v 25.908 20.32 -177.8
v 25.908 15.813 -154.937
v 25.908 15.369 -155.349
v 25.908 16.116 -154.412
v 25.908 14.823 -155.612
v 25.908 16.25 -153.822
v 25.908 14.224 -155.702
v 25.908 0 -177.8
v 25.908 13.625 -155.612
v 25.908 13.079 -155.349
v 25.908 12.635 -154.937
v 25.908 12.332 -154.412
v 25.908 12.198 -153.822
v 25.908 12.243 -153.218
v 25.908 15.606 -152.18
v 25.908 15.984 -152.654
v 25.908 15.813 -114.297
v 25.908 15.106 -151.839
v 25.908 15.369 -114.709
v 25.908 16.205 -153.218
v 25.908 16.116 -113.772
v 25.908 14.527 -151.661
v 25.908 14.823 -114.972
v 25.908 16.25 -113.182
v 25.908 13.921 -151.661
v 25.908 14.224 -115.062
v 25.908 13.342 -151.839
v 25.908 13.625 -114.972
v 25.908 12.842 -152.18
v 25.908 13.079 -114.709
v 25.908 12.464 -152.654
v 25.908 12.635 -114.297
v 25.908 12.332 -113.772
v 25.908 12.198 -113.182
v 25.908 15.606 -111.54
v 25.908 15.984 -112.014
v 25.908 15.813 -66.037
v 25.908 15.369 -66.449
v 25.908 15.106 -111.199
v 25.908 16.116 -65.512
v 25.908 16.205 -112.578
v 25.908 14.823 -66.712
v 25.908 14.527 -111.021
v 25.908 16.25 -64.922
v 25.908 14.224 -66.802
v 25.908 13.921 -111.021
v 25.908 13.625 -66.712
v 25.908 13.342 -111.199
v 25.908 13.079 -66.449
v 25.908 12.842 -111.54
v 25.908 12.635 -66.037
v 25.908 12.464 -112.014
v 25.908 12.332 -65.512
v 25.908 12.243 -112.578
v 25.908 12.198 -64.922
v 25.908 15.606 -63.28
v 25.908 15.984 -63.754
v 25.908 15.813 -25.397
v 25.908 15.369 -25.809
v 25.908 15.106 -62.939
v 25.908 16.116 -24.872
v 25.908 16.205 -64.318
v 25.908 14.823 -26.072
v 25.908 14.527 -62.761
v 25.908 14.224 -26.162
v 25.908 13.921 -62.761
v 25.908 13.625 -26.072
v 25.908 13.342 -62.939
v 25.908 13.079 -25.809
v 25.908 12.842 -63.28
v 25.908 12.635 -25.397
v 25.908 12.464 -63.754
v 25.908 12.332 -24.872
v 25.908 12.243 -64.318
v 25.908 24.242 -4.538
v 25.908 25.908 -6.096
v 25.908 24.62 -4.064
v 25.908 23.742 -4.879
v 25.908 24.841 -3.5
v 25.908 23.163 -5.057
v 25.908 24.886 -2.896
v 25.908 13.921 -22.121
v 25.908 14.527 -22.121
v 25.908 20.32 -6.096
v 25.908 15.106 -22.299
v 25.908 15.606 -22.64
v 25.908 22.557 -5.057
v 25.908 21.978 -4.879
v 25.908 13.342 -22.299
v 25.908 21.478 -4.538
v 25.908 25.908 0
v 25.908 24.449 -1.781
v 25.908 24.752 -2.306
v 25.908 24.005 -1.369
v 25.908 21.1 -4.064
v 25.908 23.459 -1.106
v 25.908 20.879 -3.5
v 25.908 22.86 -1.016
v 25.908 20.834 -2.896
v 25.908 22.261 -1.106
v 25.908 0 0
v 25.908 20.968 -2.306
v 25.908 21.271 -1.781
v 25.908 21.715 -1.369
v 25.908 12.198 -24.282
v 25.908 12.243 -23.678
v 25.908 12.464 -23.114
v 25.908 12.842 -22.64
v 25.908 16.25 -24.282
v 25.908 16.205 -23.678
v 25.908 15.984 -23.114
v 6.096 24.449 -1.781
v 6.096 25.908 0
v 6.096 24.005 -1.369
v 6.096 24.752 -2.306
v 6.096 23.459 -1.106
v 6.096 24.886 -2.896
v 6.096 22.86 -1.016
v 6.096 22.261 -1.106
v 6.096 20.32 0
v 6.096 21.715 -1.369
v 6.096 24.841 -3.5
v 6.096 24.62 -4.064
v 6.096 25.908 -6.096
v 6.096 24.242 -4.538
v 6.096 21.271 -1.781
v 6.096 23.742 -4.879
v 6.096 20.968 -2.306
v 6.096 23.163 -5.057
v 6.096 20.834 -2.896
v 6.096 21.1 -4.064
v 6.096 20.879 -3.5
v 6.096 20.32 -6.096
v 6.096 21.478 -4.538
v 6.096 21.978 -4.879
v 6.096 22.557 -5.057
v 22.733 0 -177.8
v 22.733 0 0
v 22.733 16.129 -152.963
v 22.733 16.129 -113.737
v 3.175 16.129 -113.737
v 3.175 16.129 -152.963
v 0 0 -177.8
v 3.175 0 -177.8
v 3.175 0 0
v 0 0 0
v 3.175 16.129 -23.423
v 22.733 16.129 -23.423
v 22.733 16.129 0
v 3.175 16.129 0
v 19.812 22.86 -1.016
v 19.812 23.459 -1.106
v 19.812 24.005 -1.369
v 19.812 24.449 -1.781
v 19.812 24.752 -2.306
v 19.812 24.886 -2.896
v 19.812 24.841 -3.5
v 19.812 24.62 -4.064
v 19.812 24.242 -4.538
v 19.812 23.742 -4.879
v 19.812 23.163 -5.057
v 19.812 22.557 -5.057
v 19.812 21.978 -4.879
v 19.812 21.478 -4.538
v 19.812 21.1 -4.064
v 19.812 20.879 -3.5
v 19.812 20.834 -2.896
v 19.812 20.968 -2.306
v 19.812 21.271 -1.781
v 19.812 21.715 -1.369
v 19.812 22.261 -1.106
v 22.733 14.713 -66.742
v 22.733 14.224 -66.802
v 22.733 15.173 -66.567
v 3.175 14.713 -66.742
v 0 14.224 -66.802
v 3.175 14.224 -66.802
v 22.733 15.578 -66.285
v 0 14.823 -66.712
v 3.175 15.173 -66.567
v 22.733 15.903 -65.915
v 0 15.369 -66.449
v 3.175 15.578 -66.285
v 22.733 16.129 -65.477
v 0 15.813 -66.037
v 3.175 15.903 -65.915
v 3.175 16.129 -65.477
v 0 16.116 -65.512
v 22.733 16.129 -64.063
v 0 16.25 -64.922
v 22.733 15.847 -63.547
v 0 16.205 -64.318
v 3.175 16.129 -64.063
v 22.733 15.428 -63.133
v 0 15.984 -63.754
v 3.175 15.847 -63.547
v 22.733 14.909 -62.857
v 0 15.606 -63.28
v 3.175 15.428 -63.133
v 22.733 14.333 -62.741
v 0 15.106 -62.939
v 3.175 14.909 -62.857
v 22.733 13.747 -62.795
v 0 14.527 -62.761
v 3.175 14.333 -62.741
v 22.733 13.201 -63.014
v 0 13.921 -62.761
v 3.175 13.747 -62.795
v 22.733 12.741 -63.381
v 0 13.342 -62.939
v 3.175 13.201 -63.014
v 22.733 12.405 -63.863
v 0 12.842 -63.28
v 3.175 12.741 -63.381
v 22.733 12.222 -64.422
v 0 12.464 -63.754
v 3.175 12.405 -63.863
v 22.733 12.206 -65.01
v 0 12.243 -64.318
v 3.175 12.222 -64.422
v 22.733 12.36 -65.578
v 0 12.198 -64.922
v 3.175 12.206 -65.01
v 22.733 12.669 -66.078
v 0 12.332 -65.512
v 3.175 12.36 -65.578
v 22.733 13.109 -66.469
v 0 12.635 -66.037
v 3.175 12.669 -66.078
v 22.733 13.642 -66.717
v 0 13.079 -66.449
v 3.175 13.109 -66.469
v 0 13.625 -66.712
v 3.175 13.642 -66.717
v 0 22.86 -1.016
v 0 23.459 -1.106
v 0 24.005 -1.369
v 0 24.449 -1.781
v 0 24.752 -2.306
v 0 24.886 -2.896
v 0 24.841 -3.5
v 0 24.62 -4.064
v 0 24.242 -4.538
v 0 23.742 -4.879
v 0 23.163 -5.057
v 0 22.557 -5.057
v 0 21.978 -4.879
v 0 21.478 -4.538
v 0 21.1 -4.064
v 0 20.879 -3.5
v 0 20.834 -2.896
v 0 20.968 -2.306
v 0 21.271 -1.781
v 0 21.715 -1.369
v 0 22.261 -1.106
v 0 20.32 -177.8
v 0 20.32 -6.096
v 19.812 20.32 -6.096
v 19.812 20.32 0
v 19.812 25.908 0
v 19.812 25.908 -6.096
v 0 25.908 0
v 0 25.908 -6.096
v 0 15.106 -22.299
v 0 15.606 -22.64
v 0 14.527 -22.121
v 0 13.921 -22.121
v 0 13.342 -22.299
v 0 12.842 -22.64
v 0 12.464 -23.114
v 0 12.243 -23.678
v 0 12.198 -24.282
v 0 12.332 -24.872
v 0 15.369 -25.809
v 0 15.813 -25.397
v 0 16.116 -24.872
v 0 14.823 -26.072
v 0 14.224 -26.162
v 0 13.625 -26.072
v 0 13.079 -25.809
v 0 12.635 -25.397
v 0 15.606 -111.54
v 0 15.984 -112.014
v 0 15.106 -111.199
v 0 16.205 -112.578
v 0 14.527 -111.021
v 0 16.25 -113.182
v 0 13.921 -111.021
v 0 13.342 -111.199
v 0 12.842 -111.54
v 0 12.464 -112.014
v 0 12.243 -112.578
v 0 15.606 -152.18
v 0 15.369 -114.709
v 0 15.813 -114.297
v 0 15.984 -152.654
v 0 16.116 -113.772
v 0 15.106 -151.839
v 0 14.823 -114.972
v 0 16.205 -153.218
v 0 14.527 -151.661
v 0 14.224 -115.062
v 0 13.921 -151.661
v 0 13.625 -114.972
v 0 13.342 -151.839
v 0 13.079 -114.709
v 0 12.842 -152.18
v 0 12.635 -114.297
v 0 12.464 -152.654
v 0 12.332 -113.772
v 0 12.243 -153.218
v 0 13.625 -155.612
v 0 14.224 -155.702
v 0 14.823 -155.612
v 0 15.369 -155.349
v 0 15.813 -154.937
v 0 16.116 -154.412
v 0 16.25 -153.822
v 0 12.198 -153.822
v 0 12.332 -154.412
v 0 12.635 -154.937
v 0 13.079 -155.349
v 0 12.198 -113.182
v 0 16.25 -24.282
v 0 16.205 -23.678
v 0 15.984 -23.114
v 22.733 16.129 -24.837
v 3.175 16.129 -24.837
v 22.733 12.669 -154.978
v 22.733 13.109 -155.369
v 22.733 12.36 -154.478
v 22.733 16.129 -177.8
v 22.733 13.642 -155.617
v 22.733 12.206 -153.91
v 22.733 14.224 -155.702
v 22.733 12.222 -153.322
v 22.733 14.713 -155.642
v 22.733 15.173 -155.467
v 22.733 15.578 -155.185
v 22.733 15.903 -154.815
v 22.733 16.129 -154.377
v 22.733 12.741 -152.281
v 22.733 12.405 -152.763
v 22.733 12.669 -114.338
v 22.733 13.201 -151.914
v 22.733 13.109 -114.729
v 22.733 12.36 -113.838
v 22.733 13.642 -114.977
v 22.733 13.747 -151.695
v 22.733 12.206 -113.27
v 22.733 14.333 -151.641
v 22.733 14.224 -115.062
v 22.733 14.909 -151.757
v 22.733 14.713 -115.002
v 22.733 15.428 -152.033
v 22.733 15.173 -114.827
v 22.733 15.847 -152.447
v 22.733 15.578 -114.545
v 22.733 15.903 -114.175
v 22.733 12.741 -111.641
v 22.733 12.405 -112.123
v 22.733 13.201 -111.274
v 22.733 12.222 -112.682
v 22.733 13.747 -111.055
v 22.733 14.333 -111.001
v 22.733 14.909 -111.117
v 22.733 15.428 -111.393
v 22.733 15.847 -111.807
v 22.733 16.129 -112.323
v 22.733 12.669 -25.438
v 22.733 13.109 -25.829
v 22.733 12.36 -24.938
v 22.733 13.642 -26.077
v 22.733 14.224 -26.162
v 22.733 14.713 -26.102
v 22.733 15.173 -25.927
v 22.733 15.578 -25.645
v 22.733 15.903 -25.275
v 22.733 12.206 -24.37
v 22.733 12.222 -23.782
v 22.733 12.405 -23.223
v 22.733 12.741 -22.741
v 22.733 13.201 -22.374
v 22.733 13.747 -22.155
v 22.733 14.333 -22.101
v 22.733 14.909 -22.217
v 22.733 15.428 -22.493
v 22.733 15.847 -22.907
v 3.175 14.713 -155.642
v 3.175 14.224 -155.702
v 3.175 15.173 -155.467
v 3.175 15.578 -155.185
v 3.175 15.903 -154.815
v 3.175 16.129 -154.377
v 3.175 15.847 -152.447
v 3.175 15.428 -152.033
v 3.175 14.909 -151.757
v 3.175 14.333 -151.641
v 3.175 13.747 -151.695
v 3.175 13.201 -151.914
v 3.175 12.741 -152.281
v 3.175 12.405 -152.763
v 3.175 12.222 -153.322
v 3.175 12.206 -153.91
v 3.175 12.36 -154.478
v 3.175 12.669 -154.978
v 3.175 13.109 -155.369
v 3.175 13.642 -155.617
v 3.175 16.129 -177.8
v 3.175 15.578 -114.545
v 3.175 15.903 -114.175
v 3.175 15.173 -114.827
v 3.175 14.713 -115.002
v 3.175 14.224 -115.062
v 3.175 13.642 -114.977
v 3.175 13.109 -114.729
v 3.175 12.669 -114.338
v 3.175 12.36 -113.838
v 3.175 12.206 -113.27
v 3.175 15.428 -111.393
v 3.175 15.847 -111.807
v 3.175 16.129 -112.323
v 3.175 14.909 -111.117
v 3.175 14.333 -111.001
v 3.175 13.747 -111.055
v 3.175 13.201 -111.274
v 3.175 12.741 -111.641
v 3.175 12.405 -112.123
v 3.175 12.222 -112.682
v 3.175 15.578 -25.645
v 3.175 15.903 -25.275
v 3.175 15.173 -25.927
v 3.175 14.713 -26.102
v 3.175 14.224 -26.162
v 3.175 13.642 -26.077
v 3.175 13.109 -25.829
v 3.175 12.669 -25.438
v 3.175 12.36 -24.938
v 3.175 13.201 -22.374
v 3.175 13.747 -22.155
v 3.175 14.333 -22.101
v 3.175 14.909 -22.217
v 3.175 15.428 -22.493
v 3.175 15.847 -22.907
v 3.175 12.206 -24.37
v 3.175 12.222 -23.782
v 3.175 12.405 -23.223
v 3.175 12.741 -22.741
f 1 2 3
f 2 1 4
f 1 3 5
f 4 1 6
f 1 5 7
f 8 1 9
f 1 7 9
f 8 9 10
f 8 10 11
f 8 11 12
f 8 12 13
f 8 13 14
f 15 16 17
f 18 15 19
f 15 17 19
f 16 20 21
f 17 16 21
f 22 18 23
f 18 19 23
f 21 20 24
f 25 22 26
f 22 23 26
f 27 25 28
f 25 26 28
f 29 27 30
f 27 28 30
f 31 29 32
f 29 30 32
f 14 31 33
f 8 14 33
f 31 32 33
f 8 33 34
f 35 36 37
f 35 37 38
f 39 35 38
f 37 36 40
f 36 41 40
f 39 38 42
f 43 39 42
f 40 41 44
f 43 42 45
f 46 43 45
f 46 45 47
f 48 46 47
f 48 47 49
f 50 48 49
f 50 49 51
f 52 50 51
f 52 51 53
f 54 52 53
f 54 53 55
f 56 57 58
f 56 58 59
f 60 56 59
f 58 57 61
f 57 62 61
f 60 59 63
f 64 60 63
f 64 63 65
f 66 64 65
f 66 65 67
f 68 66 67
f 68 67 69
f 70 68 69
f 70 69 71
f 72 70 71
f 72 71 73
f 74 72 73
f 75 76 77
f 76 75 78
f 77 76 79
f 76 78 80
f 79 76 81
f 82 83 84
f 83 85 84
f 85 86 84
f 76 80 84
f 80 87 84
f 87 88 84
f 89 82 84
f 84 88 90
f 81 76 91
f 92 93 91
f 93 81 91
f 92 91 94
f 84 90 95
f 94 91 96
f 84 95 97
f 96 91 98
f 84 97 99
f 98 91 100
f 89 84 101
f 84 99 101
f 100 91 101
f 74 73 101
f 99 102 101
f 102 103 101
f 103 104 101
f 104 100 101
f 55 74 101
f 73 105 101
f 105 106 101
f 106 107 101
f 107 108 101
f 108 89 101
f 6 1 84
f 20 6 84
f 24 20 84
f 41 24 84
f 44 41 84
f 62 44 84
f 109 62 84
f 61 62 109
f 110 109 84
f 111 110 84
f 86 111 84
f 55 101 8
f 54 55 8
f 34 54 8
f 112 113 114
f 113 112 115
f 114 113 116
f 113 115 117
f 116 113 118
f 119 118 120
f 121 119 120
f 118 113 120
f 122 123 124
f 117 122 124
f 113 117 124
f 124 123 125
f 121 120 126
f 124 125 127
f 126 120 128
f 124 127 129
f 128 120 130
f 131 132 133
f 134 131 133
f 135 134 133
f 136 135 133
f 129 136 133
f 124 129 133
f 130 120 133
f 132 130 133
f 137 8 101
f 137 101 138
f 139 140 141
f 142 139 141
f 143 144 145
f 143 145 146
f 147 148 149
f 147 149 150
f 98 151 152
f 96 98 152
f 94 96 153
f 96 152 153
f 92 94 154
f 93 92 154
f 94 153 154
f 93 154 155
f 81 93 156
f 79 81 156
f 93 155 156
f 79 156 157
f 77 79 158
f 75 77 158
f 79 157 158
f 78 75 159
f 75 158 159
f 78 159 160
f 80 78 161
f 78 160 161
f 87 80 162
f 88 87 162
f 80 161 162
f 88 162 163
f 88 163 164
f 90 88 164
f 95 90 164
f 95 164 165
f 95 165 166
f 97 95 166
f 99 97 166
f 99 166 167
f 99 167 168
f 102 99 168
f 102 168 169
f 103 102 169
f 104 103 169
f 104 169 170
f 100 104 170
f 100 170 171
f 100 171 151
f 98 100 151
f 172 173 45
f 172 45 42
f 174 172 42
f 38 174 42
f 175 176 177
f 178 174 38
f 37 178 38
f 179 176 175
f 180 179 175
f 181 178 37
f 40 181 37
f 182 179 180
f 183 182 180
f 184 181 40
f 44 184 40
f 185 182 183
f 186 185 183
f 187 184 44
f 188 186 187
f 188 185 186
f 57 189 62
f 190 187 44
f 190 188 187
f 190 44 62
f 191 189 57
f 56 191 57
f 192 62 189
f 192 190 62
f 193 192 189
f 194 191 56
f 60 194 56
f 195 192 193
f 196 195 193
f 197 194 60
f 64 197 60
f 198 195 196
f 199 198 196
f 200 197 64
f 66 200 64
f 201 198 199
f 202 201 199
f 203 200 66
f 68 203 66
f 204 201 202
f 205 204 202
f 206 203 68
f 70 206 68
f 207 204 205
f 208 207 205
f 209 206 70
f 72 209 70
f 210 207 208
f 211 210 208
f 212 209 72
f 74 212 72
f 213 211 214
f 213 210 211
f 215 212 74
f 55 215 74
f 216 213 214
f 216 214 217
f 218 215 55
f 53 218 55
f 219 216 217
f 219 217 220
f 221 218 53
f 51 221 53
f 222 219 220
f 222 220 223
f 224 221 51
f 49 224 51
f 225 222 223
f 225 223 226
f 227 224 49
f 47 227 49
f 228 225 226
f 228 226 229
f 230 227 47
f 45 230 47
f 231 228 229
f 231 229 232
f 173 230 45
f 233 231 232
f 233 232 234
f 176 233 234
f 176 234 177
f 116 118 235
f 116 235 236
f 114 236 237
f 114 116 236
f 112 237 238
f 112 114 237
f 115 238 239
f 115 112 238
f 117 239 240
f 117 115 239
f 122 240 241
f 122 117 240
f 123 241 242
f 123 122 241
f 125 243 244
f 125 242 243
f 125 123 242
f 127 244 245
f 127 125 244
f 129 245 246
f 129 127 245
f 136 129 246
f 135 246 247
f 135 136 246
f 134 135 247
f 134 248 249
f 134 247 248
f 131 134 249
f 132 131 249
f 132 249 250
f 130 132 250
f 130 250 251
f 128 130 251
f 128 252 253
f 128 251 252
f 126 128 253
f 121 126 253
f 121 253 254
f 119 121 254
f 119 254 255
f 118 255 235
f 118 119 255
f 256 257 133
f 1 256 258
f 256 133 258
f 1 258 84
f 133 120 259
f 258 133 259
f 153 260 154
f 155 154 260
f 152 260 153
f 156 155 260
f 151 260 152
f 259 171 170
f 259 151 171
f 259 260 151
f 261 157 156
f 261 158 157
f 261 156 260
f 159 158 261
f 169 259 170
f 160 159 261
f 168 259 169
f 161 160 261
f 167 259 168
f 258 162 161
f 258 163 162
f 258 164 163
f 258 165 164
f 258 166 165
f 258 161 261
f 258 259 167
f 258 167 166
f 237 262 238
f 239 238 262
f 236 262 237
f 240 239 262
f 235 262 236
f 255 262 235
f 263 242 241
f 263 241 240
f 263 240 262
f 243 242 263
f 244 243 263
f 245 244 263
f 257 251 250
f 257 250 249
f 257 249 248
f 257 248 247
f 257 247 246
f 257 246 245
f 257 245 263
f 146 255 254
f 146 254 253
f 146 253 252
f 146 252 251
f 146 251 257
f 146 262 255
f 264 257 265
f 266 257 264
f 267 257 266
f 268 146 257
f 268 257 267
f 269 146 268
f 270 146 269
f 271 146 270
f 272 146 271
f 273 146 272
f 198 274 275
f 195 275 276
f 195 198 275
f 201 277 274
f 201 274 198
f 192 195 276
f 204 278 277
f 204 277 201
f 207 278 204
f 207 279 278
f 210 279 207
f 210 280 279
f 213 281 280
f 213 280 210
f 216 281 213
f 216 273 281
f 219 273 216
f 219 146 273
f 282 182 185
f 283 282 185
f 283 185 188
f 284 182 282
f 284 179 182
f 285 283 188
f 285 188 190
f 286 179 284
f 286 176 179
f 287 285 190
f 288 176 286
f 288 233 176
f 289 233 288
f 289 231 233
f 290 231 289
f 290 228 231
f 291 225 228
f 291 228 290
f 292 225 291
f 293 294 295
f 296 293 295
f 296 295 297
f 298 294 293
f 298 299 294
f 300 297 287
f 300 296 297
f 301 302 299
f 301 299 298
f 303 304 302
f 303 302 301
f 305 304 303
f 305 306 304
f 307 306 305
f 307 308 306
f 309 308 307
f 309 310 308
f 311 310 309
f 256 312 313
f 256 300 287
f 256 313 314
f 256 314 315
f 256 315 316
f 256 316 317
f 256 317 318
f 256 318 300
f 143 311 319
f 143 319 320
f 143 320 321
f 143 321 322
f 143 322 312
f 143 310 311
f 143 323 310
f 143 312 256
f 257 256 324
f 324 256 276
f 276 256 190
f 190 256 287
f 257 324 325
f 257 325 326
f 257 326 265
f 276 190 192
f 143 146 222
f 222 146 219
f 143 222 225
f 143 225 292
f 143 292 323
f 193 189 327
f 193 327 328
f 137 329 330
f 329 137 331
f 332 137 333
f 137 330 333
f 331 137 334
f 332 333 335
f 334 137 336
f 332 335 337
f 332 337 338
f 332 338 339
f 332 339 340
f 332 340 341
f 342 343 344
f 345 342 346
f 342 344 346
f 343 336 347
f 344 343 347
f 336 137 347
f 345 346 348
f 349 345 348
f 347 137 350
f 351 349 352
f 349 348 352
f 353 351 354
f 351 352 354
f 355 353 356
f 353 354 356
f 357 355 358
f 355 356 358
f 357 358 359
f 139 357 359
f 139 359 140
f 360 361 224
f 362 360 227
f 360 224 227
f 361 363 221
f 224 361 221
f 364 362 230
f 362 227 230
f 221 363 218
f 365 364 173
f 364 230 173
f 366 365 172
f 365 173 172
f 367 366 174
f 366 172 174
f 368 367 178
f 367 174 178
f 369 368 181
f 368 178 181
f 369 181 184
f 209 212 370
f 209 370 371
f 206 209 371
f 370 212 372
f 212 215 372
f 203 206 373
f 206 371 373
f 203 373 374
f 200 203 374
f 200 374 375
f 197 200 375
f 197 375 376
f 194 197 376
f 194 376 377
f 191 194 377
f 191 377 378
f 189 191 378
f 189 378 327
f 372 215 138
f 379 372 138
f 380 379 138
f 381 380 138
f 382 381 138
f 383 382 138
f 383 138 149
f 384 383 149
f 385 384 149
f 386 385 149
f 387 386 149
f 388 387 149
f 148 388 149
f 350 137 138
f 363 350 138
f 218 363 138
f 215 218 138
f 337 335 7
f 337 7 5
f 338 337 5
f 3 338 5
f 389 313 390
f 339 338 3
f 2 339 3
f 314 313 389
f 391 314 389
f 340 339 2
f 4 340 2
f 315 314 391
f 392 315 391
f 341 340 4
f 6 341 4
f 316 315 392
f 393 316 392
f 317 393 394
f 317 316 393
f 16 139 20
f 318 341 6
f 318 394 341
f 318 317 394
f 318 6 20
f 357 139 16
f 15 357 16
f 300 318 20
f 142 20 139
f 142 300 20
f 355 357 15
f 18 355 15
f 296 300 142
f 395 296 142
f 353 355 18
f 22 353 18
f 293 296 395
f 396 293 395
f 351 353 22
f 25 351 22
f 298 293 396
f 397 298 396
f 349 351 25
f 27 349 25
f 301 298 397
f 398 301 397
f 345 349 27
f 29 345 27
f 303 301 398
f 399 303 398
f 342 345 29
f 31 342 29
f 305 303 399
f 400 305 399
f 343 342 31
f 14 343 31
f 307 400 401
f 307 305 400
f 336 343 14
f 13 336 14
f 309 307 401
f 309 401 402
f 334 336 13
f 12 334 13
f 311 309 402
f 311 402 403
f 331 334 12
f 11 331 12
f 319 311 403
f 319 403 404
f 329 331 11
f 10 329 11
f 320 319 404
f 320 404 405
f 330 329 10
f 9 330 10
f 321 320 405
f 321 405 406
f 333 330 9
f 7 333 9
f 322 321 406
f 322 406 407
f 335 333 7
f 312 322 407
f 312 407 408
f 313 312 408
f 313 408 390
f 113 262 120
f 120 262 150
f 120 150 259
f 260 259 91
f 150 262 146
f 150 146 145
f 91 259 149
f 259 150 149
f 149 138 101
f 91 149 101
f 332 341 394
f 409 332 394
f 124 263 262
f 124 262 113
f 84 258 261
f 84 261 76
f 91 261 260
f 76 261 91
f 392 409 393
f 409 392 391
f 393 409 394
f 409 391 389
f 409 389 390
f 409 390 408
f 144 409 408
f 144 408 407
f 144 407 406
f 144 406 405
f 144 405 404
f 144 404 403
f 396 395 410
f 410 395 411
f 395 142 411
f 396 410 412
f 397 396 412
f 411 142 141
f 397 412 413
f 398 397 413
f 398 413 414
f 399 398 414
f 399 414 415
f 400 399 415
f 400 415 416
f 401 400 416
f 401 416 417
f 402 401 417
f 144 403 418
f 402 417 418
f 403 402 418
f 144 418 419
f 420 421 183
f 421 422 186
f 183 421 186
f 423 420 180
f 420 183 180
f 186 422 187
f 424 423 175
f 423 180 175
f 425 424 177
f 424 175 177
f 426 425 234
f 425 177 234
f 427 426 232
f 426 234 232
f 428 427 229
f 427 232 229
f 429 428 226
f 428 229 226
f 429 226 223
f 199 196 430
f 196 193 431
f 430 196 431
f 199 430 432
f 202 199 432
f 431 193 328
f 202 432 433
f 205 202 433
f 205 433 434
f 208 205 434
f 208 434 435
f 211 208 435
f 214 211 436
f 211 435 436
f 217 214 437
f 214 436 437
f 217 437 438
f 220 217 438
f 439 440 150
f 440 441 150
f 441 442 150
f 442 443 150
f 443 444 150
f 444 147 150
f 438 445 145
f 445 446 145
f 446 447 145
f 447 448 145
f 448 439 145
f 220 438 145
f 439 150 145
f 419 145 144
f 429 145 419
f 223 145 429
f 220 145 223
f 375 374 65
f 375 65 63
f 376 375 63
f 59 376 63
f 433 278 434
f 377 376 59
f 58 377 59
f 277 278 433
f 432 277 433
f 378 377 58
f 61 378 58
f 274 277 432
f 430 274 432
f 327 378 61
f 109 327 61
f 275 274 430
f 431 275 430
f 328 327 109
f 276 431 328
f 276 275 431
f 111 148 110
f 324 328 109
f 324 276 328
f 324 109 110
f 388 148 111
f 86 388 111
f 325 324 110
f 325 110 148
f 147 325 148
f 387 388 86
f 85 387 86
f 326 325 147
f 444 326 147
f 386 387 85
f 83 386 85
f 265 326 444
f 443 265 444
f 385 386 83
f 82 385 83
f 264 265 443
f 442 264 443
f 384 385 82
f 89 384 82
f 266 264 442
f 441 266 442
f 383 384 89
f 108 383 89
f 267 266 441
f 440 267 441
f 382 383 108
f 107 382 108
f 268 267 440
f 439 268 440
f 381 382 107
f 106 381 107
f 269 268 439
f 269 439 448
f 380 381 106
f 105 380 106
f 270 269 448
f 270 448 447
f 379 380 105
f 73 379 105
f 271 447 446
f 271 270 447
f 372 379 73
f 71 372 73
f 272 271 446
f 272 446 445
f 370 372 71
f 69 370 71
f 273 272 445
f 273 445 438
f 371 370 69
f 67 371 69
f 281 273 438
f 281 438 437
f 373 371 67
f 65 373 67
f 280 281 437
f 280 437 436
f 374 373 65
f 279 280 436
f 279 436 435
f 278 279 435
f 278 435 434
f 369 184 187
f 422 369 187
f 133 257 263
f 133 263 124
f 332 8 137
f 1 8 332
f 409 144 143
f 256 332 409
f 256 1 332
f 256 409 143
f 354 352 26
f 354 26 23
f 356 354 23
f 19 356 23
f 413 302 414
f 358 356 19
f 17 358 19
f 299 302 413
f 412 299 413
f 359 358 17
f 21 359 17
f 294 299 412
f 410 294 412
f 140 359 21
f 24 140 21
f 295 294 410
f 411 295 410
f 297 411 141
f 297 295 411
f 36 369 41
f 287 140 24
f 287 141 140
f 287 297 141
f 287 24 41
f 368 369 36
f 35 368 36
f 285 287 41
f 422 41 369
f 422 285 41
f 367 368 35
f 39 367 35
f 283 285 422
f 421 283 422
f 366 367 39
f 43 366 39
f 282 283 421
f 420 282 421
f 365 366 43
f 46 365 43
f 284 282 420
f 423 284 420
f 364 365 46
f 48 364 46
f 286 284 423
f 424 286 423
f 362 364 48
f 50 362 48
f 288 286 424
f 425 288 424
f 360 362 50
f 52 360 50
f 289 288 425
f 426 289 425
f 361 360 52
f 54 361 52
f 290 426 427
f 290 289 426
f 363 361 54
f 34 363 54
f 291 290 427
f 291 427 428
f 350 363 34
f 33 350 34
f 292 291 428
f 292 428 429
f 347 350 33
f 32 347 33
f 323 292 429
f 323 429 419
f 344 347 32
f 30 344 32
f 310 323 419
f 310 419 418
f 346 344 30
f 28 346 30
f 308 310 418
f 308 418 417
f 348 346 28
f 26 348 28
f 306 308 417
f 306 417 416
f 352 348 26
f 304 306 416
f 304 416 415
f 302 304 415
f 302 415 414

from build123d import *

# Parameters (mm, degrees)
BOSS_EXTRUDE2_DEPTH     = 177.8
SKETCH19_R              = 2.032
CUT_EXTRUDE3_DEPTH      = 26.908
SKETCH21_W              = 6.096
SKETCH21_H              = 6.096
BOSS_EXTRUDE4_DEPTH     = 5.588
SKETCH22_R              = 2.032
CUT_EXTRUDE4_DEPTH      = 20.812
CUT_EXTRUDE4_DEPTH_BACK = 7.096


with BuildPart() as part:
    # Sketch2 → Boss-Extrude2 (new body)
    with BuildSketch(Plane.XY):
        Polygon((0, 0), (0, 20.32), (25.908, 20.32), (25.908, 0), (22.733, 0), (22.733, 16.129), (3.175, 16.129), (3.175, 0), align=None)
    extrude(amount=-BOSS_EXTRUDE2_DEPTH)

    # Sketch19 → Cut-Extrude3 (cut, through all)
    with BuildSketch(Plane(origin=(0, 0, 0), x_dir=(0, 0, -1), z_dir=(1, 0, 0))):
        with Locations((24.13, 14.224)):
            Circle(SKETCH19_R)
        with Locations((64.77, 14.224)):
            Circle(SKETCH19_R)
        with Locations((113.03, 14.224)):
            Circle(SKETCH19_R)
        with Locations((153.67, 14.224)):
            Circle(SKETCH19_R)
    extrude(amount=CUT_EXTRUDE3_DEPTH, mode=Mode.SUBTRACT)

    # Sketch21 → Boss-Extrude4 (add)
    with BuildSketch(Plane(origin=(0, 20.32, 0), x_dir=(1, 0, 0), z_dir=(0, 1, 0))):
        with Locations((3.048, 3.048)):
            Rectangle(SKETCH21_W, SKETCH21_H)
        with Locations((22.86, 3.048)):
            Rectangle(SKETCH21_W, SKETCH21_H)
    extrude(amount=BOSS_EXTRUDE4_DEPTH)

    # Sketch22 → Cut-Extrude4 (cut, two sides)
    with BuildSketch(Plane.ZY.offset(-19.812)) as cut_extrude4_sk:
        with Locations((-3.048, 22.86)):
            Circle(SKETCH22_R)
    extrude(amount=CUT_EXTRUDE4_DEPTH, mode=Mode.SUBTRACT)
    extrude(cut_extrude4_sk.sketch, amount=-CUT_EXTRUDE4_DEPTH_BACK, mode=Mode.SUBTRACT)


solid = part.part
